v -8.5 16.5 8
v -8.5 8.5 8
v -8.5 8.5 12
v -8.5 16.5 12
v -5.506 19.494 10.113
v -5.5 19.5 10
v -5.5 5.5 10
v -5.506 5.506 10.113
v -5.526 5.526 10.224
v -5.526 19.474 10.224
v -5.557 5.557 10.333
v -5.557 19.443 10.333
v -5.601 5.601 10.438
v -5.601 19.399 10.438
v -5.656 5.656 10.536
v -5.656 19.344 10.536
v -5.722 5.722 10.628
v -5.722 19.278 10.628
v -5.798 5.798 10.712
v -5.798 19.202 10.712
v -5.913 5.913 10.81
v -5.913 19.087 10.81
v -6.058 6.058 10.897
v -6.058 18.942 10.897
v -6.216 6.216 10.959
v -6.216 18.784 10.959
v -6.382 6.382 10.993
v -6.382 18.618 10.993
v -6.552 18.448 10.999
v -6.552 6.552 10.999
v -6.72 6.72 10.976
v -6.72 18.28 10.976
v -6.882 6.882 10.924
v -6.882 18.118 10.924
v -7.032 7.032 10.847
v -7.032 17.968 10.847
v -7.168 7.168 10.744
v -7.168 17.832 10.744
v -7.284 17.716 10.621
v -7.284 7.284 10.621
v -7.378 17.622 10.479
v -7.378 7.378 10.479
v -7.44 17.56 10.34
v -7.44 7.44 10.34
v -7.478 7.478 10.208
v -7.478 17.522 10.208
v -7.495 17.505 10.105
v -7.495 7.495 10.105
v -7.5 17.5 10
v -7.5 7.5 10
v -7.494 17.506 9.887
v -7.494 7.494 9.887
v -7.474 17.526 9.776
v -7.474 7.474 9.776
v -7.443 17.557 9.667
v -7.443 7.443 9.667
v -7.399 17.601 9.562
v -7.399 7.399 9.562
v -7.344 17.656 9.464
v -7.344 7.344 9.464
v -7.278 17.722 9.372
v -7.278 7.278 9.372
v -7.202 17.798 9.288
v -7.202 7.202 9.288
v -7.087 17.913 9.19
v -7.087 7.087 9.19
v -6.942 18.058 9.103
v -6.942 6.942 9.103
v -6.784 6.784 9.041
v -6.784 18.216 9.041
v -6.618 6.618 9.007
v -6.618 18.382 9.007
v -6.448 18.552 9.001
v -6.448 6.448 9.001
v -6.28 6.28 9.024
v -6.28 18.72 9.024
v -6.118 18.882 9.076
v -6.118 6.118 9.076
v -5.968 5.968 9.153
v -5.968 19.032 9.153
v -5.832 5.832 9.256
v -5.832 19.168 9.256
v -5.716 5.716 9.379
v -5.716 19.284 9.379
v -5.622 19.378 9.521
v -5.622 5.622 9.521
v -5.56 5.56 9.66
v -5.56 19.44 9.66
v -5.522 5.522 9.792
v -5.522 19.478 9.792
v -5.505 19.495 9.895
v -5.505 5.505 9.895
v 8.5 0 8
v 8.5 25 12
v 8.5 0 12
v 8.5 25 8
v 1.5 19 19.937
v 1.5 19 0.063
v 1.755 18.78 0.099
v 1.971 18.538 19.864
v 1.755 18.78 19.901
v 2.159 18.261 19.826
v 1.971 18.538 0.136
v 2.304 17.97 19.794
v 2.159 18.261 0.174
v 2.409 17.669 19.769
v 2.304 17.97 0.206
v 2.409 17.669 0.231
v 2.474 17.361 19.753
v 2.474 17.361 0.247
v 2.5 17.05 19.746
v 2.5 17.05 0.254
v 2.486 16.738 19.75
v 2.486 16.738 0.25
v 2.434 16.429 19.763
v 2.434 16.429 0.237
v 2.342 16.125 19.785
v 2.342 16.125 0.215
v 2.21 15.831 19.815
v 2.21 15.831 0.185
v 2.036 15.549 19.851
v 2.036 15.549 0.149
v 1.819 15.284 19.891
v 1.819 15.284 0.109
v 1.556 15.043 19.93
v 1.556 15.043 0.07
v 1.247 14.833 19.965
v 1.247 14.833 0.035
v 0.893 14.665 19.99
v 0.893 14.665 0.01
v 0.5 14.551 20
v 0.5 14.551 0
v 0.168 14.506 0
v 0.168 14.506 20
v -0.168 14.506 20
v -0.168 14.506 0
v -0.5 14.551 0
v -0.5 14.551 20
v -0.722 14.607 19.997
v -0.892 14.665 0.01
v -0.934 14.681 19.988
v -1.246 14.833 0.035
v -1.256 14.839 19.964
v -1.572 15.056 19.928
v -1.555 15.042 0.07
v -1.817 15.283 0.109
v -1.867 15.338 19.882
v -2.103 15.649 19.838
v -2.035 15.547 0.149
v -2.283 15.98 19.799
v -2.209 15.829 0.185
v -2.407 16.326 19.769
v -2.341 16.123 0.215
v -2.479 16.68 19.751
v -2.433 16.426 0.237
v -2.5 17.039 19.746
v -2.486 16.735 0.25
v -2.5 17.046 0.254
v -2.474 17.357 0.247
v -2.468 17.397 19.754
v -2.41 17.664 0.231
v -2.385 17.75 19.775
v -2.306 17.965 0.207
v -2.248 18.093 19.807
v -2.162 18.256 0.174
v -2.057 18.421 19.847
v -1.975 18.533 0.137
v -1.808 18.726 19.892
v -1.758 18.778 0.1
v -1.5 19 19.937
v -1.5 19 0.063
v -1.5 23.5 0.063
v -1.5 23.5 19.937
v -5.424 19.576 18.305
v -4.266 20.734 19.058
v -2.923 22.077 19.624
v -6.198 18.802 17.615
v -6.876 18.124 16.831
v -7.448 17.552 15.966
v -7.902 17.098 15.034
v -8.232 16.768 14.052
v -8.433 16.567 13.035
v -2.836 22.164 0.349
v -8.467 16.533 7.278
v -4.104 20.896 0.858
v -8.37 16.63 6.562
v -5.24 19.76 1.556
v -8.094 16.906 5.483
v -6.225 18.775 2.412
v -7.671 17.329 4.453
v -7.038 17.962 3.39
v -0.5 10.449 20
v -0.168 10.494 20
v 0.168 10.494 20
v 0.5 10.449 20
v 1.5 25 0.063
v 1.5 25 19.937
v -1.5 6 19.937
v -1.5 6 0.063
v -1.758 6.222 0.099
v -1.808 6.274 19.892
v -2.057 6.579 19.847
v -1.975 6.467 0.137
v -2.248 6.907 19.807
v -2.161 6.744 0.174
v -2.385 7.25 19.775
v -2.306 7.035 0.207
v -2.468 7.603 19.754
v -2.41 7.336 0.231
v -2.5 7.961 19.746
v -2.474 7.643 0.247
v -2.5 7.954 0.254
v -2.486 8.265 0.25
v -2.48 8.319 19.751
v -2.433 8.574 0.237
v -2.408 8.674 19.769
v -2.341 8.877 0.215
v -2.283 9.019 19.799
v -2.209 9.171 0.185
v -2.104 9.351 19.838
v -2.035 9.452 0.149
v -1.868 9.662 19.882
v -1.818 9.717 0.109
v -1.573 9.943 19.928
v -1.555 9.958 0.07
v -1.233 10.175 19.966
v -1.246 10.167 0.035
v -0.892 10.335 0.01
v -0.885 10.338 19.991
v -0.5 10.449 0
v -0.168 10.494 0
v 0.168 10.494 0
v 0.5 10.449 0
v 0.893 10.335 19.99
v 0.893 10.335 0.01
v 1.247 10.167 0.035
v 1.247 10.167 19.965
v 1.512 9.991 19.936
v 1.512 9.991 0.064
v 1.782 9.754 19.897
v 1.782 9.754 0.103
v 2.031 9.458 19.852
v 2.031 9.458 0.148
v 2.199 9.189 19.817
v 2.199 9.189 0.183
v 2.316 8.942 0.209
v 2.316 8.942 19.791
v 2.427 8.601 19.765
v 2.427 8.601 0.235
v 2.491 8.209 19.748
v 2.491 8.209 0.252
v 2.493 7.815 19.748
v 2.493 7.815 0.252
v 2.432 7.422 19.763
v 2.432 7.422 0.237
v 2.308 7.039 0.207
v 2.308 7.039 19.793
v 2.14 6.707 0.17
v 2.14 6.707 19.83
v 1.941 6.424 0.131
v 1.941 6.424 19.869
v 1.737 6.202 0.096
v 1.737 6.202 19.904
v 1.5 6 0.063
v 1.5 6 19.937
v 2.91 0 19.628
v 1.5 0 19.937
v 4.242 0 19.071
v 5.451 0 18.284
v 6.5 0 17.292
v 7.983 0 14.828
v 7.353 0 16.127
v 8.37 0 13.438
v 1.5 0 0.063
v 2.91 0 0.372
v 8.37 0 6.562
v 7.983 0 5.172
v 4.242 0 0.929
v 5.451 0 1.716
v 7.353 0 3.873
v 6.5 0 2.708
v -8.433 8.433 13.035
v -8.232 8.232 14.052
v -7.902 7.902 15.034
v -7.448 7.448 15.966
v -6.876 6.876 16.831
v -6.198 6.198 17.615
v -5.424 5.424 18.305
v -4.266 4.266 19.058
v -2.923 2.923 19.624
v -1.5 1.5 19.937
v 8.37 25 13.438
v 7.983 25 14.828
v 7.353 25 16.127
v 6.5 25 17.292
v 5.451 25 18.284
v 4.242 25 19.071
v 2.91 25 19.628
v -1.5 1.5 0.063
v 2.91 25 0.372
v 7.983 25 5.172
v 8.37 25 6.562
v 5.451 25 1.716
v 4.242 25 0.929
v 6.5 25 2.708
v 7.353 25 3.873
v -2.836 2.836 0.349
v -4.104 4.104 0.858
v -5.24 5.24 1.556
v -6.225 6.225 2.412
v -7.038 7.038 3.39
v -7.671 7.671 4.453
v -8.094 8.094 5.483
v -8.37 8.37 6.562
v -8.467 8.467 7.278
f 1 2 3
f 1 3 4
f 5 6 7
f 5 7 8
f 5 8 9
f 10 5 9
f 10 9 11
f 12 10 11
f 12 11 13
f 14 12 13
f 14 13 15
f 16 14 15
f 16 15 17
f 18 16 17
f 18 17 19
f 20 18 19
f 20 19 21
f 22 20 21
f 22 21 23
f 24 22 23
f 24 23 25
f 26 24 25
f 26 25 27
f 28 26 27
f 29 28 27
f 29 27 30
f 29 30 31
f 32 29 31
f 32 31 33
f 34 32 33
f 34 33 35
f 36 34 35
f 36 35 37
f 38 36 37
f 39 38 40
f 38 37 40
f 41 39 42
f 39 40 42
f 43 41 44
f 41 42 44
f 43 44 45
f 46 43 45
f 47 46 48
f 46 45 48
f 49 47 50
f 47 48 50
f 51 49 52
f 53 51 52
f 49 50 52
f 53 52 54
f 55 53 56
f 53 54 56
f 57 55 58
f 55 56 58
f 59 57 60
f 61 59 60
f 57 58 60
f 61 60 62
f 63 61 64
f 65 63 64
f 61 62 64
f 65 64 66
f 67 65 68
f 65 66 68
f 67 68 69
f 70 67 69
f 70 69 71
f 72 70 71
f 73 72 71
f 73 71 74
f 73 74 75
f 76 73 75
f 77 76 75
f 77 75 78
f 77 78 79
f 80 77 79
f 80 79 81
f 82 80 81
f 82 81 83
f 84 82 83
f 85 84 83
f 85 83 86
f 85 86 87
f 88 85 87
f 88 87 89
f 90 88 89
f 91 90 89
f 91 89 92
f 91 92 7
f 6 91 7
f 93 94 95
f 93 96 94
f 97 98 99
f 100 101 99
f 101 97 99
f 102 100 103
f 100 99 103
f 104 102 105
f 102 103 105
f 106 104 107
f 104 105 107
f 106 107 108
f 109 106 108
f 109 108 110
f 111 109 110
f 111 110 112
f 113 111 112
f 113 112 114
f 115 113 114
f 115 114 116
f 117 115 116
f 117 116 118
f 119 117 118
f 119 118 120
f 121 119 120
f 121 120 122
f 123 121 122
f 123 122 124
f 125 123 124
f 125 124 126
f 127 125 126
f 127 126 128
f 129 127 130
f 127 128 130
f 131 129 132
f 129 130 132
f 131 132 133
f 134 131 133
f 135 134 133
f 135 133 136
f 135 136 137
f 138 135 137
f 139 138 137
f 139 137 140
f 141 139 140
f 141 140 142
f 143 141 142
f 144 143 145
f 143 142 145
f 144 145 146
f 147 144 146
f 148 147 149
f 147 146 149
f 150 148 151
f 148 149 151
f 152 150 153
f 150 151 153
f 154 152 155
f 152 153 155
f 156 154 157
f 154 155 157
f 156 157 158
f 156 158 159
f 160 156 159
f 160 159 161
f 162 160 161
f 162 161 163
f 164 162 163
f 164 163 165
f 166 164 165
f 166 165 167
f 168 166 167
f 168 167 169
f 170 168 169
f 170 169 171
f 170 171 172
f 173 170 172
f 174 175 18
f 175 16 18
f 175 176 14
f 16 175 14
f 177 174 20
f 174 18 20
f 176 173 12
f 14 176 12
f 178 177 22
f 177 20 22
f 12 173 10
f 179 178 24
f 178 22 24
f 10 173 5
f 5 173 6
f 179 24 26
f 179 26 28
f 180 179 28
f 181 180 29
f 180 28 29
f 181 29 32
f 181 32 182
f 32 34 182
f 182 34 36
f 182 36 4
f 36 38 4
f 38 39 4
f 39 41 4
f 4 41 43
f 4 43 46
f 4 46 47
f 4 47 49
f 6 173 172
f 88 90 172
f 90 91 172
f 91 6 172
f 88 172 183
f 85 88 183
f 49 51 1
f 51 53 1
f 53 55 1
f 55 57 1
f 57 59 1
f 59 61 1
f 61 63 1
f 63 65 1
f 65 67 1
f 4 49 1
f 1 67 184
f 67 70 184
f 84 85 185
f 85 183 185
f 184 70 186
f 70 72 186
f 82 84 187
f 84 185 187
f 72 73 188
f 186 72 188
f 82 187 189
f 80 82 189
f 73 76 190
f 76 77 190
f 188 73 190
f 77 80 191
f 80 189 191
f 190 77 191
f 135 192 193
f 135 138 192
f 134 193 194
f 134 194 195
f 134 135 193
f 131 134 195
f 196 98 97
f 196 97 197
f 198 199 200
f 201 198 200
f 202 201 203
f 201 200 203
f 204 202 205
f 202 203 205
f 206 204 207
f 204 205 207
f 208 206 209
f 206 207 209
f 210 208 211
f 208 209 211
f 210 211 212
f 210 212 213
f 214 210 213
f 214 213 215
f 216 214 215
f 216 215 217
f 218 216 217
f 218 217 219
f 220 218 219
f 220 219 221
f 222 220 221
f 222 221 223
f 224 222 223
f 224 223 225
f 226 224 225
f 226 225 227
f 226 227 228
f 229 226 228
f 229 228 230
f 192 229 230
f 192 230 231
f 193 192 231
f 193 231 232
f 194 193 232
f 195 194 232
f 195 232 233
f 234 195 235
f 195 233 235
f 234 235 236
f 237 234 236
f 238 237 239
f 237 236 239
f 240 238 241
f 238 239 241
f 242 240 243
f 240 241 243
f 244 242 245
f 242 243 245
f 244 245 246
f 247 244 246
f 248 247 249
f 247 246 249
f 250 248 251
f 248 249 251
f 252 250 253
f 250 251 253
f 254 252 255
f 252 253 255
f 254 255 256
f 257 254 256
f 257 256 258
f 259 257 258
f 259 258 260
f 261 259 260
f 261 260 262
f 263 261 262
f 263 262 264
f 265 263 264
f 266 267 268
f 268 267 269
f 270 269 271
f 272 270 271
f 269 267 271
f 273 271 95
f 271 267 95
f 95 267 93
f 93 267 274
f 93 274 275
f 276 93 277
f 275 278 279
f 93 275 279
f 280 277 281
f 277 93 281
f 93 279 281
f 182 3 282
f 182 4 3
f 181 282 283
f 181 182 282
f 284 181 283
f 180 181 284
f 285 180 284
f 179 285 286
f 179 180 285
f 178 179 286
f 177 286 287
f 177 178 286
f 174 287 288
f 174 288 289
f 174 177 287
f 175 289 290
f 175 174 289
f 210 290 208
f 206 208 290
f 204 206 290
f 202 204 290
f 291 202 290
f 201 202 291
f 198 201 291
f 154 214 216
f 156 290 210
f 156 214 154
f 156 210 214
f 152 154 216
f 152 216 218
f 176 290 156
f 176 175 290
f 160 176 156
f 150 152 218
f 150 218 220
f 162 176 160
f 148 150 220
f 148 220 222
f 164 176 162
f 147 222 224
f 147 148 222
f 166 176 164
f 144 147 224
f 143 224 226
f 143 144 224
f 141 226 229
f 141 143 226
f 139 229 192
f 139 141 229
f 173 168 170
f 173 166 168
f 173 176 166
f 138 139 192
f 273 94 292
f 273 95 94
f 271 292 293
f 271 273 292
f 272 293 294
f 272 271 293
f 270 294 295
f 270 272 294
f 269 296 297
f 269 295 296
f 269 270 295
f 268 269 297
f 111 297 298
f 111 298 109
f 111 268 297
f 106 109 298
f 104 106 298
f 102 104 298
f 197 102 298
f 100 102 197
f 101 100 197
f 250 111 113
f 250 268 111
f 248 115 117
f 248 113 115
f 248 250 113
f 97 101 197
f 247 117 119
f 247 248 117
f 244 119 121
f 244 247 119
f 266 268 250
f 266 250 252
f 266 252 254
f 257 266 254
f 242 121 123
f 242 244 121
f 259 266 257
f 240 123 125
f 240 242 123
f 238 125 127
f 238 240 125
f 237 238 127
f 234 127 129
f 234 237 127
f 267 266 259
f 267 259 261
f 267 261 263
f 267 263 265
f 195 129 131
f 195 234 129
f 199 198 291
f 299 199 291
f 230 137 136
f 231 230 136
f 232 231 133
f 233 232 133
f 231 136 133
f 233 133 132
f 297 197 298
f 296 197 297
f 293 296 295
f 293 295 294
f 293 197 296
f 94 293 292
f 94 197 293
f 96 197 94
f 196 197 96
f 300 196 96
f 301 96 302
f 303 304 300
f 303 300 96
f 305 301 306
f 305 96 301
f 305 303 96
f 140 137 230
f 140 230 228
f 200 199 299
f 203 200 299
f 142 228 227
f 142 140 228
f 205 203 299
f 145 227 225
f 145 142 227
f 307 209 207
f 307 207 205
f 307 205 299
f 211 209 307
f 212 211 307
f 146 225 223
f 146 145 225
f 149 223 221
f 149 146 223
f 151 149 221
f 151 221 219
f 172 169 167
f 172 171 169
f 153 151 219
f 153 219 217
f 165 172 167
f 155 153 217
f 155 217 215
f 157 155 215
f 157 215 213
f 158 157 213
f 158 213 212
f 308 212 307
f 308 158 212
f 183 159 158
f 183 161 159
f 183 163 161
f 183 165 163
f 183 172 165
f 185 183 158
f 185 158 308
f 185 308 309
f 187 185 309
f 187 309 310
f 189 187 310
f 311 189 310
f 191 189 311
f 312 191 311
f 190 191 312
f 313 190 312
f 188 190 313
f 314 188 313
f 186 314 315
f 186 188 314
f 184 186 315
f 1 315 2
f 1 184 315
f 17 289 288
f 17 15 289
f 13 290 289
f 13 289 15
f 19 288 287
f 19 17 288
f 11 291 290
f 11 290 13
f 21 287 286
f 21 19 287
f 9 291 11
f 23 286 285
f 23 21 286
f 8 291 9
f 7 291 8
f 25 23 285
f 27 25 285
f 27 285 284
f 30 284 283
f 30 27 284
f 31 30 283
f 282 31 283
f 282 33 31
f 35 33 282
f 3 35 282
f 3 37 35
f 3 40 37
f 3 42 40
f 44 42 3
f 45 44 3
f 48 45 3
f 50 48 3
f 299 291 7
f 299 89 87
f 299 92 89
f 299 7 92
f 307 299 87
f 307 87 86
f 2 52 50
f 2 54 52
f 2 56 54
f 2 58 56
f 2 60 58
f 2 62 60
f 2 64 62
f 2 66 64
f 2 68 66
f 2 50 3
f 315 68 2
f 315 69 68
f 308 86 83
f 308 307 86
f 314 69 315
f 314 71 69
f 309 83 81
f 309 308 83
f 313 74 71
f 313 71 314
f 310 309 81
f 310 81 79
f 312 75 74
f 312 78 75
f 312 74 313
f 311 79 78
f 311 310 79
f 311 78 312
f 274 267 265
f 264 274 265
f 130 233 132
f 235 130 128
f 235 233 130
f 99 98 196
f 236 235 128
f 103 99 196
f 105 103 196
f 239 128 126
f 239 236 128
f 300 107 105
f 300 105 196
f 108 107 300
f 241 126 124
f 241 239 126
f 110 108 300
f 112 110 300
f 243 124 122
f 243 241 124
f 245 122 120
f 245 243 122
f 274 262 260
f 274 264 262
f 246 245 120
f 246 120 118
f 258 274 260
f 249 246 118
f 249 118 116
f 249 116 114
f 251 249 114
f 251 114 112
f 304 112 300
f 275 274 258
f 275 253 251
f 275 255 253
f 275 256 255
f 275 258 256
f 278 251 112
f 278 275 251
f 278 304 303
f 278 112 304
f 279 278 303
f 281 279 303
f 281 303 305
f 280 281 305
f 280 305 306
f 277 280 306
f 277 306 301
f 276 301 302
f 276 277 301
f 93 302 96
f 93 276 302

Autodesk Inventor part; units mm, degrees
ref_plane "YZ Plane" through (0, 0, 0) normal (1, 0, 0) x (0, 1, 0)
ref_plane "XZ Plane" through (0, 0, 0) normal (0, 1, 0) x (-1, 0, 0)
ref_plane "XY Plane" through (0, 0, 0) normal (0, 0, 1) x (1, 0, 0)
sketch "Sketch1" plane through (0, 0, 0) normal (0, 0, 1) x (1, 0, 0)
  line L0 (0, 0) -> (2.5, 0)
  line L1 (2.5, 0) -> (2.5, 25)
  line L2 (2.5, 25) -> (-2.5, 25)
  line L3 (-2.5, 25) -> (-2.5, 0)
  circle A0 centre (0, 0) radius 8.5
  line L4 (0, 25) -> (8.5, 25) construction
  circle A1 centre (0, 25) radius 8.5
  line L5 (-8.5, 0) -> (-8.5, 25)
  line L6 (8.5, 25) -> (8.5, 0)
  line L7 (0, 25) -> (8.5, 25)
  line L8 (0, 25) -> (-8.5, 16.5)
  line L9 (0, 25) -> (12.0208, 25) construction
  line L10 (0, 0) -> (8.5, 0)
  line L11 (0, 0) -> (-8.5, 8.5)
  line L12 (0, 0) -> (12.0208, 0) construction
  dimension "d9" = 17
  dimension "d1" = 2.5
  dimension "d2" = 25
  dimension "d3" = 5
  dimension "d5" = 17
  dimension "d10" = 2.5
  dimension "d11" = 0
  dimension "d12" = 135
  dimension "d13" = 135
extrude "Extrusion1" add sketch "Sketch1" along normal blind 20 contours L11 L3 A0 L1 L0 | L1 A0 L10 | L11 A0 L3 | A0 L3 A1 L1 | L1 A1 L6 A0 | A0 L11 L5 L8 A1 L3 | A1 L3 L8 L2 L1 | L1 L7 A1 | A1 L8 L3
sketch "Sketch2" plane through (0, 0, 0) normal (0, 0, -1) x (-1, 0, 0)
  line L0 (0, 0) -> (-8.5, 0) projected
  line L1 (0, 0) -> (0, 8)
  circle A0 centre (0, 8) radius 2.5
  line L2 (8.5, 8.5) -> (0, 0) projected
  line L3 (0, 0) -> (-1.5, 0)
  line L4 (-1.5, 0) -> (-1.5, 8)
  line L5 (-1.5, 8) -> (1.5, 8)
  line L6 (1.5, 8) -> (1.5, 0)
  line L7 (1.5, 0) -> (0, 0)
  line L8 (0, 25) -> (8.5, 16.5) projected
  line L9 (0, 25) -> (0, 17)
  line L10 (0, 17) -> (-1.5, 17)
  line L11 (-1.5, 17) -> (-1.5, 25)
  line L12 (-8.5, 25) -> (0, 25) projected
  line L13 (0, 17) -> (1.5, 17)
  line L14 (1.5, 17) -> (1.5, 25)
  line L15 (1.5, 25) -> (0, 25)
  circle A1 centre (0, 17) radius 2.5
  point P0 (1.5, 45)
  point P1 (-1.5, 19)
  point P2 (1.5, 19)
  point P3 (-1.5, 6)
  point P4 (1.5, 6)
  dimension "d16" = 8
  dimension "d17" = 5
  dimension "d18" = 1.5
  dimension "d19" = 3
  dimension "d20" = 8
  dimension "d21" = 1.5
  dimension "d22" = 1.5
  dimension "d23" = 5
extrude "Extrusion2" cut sketch "Sketch2" against normal through all
fillet "Fillet1" radius 8 4 edges at (8.5, 12.5, 0) (8.5, 12.5, 20) (-8.5, 12.5, 0) (-8.5, 12.5, 20)
sketch "Sketch4" plane through (1.5, 0, 0.0627) normal (0, -1, 0) x (1, 0, 0)
  line L0 (-10, 7.9373) -> (-10, 11.9373) projected
  line L1 (-10, 9.9373) -> (-8, 9.9373)
  circle A0 centre (-8, 9.9373) radius 1
  point P0 (-1.5, -0.0627)
  dimension "d31" = 2
  dimension "d32" = 2
extrude "Extrusion4" cut sketch "Sketch4" against normal through all
properties part number "index_f2"
